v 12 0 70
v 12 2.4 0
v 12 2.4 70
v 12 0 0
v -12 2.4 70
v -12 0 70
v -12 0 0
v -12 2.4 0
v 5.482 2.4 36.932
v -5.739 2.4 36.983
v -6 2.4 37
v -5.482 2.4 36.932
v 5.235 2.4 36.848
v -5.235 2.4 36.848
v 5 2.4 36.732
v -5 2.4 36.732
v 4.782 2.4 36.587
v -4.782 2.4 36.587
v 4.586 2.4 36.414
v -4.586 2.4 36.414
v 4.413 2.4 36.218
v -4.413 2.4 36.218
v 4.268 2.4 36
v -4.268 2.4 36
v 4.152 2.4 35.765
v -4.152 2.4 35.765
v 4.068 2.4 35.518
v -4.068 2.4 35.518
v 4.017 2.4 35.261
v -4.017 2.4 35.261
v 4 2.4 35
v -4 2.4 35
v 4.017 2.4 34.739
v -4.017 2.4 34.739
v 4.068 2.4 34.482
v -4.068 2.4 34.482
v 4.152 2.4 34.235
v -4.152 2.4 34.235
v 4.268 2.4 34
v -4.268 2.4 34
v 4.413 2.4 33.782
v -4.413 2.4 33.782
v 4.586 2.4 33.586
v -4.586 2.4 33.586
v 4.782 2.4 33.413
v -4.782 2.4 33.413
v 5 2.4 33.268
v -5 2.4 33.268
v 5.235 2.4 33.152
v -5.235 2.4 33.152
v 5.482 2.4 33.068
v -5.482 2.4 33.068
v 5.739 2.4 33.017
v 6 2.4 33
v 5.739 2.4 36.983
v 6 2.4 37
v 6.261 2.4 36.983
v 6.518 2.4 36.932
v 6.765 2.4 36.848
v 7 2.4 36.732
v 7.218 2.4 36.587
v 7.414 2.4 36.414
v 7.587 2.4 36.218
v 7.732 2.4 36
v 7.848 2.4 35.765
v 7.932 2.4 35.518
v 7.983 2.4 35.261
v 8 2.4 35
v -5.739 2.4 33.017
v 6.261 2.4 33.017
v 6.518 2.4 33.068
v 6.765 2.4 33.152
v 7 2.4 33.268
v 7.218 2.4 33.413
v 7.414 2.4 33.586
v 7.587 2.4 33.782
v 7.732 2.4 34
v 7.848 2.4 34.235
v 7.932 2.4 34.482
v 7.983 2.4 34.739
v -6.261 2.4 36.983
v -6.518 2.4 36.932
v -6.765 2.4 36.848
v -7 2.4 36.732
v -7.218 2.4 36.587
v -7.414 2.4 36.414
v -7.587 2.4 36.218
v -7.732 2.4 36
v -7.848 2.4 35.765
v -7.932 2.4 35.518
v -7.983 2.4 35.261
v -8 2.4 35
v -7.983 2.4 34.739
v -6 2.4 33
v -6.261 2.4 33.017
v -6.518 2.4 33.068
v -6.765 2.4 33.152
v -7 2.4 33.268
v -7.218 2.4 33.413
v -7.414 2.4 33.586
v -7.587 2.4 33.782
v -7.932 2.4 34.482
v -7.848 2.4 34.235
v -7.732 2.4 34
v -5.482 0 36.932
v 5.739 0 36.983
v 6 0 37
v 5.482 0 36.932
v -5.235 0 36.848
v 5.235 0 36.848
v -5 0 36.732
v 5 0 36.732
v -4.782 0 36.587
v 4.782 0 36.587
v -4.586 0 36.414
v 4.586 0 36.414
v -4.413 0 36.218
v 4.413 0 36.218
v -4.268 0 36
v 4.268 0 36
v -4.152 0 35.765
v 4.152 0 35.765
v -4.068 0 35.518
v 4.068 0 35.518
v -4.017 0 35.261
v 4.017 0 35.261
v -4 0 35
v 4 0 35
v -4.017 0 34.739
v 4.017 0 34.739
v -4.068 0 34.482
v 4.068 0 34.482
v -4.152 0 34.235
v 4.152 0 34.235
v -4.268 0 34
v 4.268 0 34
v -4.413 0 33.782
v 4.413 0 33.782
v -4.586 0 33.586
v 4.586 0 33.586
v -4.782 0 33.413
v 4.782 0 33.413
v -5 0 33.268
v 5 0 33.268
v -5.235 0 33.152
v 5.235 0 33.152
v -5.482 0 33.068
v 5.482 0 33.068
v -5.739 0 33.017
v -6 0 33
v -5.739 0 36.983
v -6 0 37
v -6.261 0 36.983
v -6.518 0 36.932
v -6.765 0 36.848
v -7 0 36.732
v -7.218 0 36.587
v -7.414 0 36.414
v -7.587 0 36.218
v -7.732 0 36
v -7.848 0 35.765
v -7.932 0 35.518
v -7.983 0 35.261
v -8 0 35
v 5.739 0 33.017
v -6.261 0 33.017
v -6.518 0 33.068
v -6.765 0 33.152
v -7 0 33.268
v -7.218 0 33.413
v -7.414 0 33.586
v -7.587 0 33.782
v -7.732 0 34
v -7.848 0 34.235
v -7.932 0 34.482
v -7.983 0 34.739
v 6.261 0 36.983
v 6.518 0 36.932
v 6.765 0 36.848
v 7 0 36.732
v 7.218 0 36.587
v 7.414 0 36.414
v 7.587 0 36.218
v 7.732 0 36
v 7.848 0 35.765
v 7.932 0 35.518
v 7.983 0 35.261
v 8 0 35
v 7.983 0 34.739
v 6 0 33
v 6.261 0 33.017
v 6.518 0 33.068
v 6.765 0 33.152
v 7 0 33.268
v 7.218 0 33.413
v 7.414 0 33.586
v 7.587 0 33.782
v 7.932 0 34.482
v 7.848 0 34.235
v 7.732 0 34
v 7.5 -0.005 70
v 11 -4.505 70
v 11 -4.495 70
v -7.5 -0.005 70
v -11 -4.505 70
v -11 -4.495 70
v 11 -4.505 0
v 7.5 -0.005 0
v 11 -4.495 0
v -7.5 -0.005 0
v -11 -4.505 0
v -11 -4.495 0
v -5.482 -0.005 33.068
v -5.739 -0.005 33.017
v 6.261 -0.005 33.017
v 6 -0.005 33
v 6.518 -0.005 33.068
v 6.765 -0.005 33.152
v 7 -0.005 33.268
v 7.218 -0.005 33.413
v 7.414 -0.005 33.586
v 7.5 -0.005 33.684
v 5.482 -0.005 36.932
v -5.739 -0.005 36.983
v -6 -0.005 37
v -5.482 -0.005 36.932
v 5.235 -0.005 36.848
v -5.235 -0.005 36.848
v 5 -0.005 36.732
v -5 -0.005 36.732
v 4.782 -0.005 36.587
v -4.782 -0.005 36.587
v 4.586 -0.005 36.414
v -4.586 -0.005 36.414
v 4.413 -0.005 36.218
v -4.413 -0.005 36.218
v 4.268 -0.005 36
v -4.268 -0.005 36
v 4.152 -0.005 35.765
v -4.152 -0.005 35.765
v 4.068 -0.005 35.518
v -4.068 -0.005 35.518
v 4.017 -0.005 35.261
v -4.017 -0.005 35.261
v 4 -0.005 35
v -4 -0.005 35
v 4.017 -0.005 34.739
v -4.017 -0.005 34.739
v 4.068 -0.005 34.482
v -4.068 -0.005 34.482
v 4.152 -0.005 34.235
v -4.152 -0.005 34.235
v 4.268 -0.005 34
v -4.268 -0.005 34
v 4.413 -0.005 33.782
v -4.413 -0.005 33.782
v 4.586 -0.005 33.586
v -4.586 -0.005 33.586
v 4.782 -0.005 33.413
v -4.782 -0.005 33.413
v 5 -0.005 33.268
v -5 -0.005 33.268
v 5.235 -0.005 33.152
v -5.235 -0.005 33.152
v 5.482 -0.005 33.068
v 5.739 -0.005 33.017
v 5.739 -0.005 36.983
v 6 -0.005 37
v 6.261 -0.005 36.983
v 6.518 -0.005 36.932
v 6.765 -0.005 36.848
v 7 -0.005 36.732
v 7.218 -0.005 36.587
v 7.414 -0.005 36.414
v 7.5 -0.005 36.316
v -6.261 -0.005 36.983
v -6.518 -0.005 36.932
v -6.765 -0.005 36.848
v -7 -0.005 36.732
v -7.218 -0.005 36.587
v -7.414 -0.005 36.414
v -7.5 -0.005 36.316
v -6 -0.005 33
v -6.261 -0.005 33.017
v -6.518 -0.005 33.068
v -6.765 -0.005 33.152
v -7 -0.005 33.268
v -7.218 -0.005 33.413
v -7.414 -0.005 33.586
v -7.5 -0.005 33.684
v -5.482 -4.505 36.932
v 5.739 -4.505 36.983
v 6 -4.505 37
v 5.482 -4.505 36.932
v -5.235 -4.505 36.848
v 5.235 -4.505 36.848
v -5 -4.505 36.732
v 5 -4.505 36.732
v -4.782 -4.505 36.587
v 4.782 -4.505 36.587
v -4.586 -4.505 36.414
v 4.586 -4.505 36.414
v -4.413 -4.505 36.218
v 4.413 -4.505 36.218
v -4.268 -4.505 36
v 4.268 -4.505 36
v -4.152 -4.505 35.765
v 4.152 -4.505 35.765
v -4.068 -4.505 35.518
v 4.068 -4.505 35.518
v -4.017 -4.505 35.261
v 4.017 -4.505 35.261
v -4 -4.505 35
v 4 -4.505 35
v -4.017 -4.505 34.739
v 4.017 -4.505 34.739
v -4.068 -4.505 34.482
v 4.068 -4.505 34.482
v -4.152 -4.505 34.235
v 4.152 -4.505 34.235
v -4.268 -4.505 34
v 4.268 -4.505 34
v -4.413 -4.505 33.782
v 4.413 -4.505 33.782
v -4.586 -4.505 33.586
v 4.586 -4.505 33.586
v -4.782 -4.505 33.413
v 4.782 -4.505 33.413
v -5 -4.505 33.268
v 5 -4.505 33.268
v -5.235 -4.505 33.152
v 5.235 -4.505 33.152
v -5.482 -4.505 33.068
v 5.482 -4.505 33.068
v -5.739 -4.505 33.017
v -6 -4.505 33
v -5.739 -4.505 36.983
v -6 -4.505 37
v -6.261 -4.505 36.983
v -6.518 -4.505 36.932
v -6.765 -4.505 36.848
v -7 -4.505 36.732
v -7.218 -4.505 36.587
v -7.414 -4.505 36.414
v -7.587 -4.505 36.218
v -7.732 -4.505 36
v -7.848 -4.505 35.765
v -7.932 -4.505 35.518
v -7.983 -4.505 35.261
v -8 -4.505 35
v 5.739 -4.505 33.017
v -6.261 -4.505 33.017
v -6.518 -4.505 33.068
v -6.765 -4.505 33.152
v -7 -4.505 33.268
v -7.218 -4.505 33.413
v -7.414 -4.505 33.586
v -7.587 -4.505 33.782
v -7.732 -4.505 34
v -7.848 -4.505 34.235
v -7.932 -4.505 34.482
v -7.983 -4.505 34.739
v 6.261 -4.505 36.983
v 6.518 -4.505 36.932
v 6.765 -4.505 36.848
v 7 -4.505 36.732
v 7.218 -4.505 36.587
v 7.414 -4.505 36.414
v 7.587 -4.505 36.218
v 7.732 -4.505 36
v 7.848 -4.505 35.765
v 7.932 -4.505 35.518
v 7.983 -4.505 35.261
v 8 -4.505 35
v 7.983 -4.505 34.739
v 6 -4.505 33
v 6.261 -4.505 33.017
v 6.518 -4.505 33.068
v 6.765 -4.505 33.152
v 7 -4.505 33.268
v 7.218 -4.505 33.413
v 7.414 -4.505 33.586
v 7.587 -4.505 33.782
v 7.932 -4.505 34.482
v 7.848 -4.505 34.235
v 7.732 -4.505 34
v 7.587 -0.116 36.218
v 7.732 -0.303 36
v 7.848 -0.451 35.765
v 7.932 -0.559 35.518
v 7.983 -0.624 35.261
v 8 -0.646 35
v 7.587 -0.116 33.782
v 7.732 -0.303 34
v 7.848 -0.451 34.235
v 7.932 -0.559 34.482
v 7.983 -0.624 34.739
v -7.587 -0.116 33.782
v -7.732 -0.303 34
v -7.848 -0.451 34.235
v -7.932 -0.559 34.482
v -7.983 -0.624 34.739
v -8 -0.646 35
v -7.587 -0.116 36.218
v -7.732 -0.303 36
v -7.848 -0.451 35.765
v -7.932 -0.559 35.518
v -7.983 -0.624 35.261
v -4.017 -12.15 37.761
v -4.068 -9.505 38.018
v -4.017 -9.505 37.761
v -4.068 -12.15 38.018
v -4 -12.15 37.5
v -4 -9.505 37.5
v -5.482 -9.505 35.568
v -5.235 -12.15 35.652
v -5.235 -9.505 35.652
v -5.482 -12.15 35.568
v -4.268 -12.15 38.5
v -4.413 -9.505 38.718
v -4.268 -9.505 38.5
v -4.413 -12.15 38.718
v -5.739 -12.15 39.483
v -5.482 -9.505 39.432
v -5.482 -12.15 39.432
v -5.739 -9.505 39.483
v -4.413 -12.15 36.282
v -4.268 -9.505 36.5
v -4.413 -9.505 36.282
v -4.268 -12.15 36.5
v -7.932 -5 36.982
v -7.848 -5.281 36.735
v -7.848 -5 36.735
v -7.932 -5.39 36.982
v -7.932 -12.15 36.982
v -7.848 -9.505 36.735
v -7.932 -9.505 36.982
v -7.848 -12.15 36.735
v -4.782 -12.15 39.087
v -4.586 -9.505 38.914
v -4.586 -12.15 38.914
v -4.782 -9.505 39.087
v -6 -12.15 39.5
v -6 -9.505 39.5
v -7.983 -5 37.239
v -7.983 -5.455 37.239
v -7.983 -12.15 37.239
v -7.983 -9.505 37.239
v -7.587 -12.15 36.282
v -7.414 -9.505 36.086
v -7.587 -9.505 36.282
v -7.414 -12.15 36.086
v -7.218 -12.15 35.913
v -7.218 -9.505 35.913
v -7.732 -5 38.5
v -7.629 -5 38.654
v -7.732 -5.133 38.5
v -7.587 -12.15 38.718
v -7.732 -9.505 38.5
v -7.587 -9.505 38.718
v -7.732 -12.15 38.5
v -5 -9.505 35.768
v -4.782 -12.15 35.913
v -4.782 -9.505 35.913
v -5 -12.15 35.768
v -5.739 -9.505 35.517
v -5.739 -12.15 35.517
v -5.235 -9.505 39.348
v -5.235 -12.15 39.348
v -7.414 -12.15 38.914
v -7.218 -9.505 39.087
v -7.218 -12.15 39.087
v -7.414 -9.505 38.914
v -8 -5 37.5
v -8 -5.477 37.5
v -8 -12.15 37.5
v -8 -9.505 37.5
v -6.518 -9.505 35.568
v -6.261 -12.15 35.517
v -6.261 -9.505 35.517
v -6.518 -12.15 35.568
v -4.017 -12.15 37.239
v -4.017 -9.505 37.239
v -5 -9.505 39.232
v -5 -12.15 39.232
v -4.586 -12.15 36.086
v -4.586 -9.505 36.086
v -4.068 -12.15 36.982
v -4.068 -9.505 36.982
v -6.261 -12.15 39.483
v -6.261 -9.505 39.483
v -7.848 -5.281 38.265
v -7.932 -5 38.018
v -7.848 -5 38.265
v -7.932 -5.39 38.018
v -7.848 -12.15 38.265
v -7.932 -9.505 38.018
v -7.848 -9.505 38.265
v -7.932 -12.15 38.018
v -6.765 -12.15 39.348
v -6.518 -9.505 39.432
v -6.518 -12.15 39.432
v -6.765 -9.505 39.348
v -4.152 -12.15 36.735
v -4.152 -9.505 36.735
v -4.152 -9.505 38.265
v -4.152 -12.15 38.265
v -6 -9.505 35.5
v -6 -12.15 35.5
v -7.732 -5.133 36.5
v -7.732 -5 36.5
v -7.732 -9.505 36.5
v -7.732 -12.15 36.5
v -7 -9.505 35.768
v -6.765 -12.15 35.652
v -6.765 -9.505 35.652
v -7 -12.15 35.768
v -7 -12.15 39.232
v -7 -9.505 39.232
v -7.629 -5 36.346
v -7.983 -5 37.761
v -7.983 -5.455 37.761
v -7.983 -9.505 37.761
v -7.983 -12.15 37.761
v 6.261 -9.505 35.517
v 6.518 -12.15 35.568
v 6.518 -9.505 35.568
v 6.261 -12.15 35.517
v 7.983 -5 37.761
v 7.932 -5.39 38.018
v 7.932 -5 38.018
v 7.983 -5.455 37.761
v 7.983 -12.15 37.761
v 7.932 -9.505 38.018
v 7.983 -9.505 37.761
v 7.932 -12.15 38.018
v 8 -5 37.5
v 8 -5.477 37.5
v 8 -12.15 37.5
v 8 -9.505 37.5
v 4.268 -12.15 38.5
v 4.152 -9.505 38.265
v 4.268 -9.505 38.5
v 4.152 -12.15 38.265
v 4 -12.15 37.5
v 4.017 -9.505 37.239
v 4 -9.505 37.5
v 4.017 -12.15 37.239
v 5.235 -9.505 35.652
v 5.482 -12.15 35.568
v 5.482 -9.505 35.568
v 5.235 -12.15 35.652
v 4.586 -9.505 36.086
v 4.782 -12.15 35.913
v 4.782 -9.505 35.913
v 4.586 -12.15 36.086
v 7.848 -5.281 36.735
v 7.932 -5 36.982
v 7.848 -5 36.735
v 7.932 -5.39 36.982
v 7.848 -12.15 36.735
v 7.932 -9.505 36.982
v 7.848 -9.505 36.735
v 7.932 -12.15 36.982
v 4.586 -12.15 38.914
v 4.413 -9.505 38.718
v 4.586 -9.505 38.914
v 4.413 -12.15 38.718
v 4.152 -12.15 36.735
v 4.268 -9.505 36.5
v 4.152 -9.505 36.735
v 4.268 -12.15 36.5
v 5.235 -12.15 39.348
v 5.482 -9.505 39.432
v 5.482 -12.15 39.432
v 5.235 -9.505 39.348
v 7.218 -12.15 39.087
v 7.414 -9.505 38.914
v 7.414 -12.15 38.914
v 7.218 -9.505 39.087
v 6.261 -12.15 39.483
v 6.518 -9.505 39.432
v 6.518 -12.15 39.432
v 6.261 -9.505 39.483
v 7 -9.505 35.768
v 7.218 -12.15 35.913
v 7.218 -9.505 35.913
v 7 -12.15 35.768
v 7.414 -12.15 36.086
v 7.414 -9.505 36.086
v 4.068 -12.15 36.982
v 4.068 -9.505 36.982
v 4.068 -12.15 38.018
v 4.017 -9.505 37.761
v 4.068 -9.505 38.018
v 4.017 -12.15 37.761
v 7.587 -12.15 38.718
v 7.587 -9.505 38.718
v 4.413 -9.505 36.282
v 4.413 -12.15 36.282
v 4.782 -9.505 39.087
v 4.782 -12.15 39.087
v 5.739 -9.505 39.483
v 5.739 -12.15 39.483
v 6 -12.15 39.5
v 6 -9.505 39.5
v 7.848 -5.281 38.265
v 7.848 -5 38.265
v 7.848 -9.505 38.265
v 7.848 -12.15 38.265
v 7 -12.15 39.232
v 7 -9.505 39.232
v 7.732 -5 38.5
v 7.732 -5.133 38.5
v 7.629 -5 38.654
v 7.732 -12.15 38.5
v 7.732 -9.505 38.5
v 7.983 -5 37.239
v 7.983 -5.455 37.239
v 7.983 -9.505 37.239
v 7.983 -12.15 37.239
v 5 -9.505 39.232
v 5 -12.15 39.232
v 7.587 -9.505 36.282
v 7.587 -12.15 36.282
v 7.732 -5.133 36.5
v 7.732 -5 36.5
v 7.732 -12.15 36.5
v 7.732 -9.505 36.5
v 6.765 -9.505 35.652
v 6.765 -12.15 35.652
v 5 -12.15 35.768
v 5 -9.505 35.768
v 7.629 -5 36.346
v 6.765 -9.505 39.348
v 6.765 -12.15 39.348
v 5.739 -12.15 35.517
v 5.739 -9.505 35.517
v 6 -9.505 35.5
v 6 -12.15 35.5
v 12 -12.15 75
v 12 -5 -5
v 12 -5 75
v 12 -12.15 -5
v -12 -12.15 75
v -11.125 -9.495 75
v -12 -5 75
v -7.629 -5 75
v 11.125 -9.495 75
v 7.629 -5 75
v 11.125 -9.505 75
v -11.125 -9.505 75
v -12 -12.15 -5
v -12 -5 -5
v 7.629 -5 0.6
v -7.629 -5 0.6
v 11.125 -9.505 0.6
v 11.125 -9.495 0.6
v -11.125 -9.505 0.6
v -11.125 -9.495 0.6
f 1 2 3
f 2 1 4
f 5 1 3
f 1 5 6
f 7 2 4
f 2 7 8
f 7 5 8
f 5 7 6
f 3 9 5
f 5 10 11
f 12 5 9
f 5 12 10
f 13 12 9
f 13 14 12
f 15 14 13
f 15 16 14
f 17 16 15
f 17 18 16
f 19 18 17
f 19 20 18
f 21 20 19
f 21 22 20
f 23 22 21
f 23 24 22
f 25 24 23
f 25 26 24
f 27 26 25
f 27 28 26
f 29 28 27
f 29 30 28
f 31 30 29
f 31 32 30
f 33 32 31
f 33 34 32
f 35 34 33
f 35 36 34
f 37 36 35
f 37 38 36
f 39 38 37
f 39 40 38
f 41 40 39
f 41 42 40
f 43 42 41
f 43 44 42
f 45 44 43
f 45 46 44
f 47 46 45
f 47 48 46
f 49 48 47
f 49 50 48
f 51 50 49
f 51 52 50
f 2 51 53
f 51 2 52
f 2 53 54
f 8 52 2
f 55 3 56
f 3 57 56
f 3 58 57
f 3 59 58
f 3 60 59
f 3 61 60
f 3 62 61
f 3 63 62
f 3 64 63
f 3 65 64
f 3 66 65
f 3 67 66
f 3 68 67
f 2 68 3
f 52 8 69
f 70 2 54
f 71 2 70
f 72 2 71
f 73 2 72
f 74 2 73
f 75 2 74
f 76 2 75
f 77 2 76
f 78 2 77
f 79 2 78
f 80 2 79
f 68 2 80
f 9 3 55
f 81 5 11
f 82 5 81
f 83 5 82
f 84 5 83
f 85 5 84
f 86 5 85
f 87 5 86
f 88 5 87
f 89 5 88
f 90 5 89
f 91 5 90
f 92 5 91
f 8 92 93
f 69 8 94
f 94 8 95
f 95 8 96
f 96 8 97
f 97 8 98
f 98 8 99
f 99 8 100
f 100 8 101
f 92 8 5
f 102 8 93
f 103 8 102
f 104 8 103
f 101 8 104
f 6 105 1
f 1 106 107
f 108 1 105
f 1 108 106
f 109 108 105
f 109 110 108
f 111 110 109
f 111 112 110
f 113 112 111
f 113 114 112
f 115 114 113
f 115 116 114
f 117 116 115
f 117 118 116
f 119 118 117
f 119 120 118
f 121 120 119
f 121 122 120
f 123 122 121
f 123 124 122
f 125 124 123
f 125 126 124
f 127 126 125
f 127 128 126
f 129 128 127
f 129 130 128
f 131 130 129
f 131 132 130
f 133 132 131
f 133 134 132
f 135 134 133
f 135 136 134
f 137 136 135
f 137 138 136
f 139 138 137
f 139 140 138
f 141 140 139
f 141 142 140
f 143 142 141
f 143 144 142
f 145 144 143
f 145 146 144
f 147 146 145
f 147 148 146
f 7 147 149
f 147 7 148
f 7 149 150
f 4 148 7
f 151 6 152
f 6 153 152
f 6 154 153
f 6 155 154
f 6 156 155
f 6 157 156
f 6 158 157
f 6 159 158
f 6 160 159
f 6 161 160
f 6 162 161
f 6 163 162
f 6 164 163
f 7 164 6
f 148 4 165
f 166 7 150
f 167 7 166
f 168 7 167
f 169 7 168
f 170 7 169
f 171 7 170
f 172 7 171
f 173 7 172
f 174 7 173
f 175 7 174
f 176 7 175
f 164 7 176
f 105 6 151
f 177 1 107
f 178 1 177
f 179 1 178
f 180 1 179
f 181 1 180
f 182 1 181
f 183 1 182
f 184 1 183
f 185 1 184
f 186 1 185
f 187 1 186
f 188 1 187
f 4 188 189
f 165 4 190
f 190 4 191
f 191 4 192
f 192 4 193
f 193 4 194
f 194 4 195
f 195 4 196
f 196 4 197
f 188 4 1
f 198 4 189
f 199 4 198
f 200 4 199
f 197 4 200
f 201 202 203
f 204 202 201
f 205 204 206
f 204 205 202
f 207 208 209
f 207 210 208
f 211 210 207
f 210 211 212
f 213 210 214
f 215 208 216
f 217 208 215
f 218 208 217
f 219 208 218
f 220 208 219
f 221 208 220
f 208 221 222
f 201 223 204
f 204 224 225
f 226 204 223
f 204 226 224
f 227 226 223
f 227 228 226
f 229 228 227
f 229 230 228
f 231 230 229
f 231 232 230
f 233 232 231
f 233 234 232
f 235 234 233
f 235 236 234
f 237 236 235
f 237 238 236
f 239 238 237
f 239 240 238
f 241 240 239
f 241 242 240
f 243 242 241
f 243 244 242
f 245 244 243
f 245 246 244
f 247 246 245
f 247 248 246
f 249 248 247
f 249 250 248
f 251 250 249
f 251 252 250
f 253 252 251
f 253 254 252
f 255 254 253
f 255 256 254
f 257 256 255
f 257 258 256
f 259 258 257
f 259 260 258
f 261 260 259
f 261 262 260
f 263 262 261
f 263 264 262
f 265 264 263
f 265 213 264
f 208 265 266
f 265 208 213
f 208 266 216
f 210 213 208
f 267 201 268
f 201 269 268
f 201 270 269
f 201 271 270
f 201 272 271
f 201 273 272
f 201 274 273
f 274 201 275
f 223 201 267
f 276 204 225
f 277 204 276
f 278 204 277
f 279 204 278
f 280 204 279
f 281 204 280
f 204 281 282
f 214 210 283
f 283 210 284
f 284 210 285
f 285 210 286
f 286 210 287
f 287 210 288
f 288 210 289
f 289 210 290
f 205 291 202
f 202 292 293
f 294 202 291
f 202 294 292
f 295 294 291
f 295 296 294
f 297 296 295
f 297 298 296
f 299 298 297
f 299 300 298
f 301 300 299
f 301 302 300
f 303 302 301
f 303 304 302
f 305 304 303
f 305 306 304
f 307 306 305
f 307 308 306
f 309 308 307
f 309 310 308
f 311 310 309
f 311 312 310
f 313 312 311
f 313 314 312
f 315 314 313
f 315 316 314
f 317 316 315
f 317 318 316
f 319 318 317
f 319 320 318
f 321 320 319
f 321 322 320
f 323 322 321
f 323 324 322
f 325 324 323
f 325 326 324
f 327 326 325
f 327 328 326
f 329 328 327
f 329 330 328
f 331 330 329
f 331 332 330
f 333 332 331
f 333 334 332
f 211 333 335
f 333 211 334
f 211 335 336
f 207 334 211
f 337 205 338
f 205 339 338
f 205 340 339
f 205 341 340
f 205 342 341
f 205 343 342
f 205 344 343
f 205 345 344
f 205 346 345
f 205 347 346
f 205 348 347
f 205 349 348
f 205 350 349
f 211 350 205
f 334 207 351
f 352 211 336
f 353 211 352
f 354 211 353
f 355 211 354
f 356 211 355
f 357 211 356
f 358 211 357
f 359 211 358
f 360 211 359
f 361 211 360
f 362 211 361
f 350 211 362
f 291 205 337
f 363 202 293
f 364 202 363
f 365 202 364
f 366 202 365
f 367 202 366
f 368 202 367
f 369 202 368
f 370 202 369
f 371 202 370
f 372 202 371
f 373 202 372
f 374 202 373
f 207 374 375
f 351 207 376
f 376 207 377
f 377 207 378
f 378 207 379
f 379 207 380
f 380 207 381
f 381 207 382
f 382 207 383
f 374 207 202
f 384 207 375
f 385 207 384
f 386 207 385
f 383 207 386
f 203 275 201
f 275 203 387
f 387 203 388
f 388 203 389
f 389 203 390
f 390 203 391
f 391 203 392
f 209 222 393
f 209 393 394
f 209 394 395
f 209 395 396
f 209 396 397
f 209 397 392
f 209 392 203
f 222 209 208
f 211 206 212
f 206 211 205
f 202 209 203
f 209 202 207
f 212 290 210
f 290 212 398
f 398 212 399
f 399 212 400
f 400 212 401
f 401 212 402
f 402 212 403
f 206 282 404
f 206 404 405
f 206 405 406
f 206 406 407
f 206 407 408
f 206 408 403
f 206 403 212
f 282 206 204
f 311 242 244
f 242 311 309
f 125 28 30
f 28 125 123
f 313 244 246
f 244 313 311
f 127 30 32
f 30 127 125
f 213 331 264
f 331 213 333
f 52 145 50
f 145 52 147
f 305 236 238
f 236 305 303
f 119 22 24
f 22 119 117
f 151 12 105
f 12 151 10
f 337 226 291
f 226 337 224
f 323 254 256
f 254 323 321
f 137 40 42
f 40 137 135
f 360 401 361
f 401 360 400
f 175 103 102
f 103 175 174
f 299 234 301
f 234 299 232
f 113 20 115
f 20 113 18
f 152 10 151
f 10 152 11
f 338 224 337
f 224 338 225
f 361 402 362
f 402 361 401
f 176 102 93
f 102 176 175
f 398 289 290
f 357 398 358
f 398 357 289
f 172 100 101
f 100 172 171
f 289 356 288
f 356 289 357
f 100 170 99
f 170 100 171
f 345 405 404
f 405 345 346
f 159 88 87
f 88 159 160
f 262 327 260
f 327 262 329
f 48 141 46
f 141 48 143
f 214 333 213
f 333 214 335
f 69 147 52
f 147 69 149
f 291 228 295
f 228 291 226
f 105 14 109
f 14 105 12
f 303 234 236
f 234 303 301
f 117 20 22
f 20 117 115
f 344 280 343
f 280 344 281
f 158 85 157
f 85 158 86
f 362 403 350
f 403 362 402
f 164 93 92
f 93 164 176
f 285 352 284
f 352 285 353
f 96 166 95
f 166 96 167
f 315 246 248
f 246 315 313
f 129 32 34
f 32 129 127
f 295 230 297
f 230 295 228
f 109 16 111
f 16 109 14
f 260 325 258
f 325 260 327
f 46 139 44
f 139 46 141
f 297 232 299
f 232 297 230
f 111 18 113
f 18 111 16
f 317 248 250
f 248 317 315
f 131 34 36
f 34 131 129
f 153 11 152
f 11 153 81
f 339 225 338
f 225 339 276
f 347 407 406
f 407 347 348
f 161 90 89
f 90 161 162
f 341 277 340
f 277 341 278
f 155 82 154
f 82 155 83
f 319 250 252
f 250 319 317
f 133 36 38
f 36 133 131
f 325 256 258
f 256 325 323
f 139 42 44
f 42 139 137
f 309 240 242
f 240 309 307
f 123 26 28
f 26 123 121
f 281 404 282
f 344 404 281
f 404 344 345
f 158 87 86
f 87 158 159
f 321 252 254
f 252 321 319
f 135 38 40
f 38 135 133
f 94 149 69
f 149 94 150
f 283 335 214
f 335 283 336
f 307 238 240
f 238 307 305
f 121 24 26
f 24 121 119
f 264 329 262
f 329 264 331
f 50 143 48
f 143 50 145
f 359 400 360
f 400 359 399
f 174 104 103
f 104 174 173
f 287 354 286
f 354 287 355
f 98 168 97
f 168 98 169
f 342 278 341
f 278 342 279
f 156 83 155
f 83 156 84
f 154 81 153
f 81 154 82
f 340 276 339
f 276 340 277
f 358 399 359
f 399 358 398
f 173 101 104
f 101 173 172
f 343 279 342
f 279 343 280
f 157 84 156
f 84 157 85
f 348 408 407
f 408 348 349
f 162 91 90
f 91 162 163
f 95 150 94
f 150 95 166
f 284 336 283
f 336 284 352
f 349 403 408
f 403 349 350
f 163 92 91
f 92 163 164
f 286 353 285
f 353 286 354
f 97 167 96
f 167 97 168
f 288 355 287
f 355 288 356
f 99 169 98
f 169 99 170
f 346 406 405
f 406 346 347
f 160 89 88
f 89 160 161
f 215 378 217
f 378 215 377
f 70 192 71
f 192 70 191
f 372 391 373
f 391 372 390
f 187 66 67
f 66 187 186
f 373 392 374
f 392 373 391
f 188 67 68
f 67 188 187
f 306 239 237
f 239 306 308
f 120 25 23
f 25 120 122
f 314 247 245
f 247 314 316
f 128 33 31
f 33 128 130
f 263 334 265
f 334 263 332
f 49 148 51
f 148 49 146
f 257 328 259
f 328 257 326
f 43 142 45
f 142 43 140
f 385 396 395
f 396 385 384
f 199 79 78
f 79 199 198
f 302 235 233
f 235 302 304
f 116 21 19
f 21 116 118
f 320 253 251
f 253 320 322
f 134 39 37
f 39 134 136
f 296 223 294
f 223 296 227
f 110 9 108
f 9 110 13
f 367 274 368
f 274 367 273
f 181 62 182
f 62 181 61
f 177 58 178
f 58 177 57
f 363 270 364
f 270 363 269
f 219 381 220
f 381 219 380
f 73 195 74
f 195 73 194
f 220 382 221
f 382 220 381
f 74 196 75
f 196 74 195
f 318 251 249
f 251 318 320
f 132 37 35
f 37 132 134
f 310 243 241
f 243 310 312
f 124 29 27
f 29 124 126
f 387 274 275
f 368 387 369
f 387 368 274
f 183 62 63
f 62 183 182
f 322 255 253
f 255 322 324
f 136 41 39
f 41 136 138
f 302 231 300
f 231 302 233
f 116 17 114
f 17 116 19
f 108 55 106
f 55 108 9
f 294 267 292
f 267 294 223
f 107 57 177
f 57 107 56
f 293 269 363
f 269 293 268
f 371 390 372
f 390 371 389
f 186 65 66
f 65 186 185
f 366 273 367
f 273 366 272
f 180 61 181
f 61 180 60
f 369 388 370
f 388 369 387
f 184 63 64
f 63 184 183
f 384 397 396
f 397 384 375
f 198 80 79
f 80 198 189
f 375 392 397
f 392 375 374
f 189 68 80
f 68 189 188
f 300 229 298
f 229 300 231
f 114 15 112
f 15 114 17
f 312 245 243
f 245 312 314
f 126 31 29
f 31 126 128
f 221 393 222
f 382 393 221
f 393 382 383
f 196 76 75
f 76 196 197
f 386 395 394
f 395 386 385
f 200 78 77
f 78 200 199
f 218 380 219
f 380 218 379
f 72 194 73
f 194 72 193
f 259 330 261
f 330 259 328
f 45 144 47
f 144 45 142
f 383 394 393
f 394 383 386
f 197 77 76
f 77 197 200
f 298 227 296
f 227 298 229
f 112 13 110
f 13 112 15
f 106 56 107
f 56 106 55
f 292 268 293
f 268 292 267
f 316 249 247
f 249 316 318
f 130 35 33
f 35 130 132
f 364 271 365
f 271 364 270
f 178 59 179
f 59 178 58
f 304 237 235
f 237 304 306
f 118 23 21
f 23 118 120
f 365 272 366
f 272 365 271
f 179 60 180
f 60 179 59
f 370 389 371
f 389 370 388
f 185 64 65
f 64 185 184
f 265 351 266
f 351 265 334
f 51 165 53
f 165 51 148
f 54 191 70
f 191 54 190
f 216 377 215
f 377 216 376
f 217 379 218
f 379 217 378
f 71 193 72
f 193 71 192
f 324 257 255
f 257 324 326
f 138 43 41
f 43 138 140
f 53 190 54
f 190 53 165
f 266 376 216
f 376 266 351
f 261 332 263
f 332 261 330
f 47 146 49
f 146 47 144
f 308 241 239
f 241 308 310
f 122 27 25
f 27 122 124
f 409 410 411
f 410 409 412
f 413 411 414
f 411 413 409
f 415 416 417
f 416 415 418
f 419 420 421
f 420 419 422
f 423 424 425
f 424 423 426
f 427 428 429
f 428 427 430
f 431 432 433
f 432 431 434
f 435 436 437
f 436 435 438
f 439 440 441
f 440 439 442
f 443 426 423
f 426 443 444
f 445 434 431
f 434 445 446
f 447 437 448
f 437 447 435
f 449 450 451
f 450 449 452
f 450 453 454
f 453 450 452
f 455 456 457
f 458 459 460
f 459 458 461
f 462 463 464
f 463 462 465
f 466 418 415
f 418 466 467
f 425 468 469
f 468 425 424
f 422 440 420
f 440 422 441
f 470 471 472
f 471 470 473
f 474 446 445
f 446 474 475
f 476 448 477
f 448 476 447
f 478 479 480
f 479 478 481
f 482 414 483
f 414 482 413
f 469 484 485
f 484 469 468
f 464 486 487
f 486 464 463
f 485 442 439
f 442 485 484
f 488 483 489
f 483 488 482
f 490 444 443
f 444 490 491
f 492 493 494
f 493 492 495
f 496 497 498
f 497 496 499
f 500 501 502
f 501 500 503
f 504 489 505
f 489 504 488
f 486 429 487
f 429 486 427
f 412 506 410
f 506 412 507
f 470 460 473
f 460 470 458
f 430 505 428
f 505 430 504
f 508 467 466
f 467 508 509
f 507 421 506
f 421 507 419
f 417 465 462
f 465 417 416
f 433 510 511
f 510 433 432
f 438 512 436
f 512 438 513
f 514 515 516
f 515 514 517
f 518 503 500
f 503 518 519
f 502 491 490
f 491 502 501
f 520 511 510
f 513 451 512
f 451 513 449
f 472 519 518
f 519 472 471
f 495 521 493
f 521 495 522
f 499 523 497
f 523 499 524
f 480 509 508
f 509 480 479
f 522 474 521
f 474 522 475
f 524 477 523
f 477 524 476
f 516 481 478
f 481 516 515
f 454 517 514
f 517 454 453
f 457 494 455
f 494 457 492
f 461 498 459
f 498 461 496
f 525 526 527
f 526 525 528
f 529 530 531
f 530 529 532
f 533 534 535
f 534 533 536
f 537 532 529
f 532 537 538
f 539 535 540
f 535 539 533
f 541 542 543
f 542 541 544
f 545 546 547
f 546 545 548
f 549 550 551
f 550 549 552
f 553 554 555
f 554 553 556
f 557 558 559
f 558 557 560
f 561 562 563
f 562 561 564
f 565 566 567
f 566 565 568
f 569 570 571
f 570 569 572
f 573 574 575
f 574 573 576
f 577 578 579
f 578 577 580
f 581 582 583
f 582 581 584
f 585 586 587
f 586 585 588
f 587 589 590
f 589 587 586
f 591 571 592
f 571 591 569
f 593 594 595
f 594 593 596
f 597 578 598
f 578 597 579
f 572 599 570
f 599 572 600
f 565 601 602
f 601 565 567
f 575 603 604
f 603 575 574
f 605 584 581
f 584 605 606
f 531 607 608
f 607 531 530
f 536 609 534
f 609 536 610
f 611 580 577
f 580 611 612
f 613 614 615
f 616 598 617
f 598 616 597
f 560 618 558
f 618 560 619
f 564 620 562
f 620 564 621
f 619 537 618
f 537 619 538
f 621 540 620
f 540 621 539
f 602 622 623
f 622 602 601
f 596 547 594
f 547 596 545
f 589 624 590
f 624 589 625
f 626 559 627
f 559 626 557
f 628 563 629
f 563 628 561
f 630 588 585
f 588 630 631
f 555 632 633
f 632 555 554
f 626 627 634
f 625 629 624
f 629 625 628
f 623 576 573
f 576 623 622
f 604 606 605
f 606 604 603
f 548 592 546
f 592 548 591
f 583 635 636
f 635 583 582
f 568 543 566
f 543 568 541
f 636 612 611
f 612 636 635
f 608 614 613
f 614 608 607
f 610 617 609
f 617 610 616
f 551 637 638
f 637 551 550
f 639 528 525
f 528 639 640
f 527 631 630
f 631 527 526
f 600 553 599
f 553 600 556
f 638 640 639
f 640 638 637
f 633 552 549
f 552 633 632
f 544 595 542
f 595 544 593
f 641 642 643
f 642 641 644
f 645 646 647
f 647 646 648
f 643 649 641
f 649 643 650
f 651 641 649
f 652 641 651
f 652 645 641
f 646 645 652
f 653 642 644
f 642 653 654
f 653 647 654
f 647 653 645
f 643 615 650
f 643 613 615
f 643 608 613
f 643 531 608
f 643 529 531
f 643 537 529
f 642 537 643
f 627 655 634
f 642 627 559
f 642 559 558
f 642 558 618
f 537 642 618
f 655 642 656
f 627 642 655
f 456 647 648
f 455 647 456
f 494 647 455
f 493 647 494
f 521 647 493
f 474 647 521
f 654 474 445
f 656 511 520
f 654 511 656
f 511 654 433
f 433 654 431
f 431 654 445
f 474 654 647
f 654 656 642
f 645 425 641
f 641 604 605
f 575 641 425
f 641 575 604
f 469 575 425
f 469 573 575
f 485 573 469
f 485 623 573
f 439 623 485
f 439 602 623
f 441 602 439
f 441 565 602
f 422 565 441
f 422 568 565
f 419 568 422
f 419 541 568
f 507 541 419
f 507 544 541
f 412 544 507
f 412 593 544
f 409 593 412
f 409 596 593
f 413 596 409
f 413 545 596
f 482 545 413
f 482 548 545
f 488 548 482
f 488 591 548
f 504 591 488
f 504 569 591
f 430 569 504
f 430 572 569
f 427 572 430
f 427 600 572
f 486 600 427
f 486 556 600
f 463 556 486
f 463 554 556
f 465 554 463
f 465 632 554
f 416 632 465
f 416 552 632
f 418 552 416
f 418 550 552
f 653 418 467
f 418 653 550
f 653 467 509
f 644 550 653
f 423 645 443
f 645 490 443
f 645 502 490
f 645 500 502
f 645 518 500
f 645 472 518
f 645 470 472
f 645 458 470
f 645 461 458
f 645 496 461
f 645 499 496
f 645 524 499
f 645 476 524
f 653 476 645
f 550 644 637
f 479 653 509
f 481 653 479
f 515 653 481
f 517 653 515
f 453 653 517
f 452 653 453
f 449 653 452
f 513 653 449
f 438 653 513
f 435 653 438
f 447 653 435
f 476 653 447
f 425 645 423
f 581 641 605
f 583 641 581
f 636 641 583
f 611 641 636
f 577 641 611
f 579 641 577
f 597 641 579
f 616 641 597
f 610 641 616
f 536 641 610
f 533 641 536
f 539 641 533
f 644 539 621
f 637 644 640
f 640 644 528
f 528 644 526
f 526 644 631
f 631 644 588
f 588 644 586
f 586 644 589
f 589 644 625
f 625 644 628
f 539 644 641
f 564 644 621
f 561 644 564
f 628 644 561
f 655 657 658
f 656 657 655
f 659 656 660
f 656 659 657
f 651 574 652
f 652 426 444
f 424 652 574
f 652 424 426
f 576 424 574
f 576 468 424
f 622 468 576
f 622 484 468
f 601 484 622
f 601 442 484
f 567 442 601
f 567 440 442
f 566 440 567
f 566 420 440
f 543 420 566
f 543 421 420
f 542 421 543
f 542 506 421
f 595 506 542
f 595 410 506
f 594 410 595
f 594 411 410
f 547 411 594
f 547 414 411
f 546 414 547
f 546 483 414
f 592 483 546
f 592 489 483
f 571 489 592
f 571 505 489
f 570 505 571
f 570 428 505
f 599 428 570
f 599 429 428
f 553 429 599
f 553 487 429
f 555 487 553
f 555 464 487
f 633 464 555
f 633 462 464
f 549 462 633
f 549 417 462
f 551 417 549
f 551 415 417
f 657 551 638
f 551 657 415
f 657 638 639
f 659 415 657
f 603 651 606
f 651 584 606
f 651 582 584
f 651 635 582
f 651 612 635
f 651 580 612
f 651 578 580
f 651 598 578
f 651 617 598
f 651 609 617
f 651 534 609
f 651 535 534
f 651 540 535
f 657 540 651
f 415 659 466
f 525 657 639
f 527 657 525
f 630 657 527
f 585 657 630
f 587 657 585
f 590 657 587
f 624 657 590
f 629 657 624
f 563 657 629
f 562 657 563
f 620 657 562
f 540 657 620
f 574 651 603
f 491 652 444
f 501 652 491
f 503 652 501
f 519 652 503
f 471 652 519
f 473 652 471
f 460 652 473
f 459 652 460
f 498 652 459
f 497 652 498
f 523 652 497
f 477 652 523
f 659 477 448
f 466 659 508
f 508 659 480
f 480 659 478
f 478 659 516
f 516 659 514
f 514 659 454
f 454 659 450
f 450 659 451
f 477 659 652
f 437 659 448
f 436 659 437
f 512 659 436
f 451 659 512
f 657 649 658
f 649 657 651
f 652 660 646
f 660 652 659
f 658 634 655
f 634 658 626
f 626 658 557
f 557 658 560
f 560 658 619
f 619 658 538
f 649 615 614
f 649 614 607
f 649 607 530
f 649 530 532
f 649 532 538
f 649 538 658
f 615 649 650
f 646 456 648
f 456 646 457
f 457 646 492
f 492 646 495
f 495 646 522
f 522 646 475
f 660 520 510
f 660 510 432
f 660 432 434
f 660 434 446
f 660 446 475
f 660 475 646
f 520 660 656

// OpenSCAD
/* ========================================================================== */ // Starts the file header.
/* Dovetail from the box/bin model, extracted and parameterized. */ // Describes the model origin.
/* The dovetail can be screwed or glued to the back of what is mounted. */ // Describes the intended use.
/* Designed by Notydesign. */ // Credits the original designer.
/* Comments and documentation added for easier maintenance. */ // States why the file is heavily commented.
/* ========================================================================== */ // Ends the file header.
// All dimensions in this file are millimeters. // Defines the unit used by every numeric dimension.
// X is width, Y is depth/thickness, and Z is height. // Defines the coordinate convention.
// OpenSCAD Customizer reads section titles written inside square brackets. // Explains the bracketed headings below.

/* [Display options] */ // Groups settings that control preview visibility.
show_dovetail = true; // Shows the male dovetail part.
show_bracket = true; // Shows the female bracket part.
mirror_backstop = false; // Rotates the preview 180 degrees around the Y axis so the stop is mirrored.
color = "#4682B4"; // Sets the preview color for both generated parts.

/* [Dovetail male parameters] */ // Groups the main dimensions for the male dovetail.
dovetail_width_wide = 22; // Sets the widest width of the dovetail profile at the outer face.
dovetail_width_narrow = 15; // Sets the narrowest width of the dovetail profile near the plate.
dovetail_depth = 4.5; // Sets how far the dovetail profile projects in the Y direction.
dovetail_tolerance = 0.25; // Sets clearance between the male and female parts for 3D printing fit.
dovetail_plate_width = 24; // Sets the width of the male mounting plate.
dovetail_plate_thickness = 2.4; // Sets the thickness of the male mounting plate.
dovetail_plate_height = 70; // Sets the total height of the male dovetail part.

/* [Dovetail male screw hole parameters] */ // Groups screw-hole settings for the male part.
show_dovetail_screw_holes = true; // Enables through screw holes in the male part.
dovetail_screw_count = 2; // Sets the number of screw holes per row in the X direction.
dovetail_screw_row_count = 1; // Sets the number of screw rows in the Z direction.
dovetail_screw_row_spacing = 20; // Sets the center-to-center spacing between screw rows.
dovetail_screw_edge_margin = 6; // Sets the margin from each side edge to the outermost screw hole.
mount_screw_hole_diameter = 4; // Sets the diameter of the male screw holes.

/* [Dovetail male countersink parameters] */ // Groups countersink settings for the male screw holes.
male_screw_countersink_style = "none"; // Selects the countersink style: none, cone, or cylinder.
male_screw_countersink_side = "back"; // Selects the countersink side: front, back, or both.
male_screw_countersink_diameter = 8; // Sets the outer diameter of the male countersink.
male_screw_countersink_depth = 1.6; // Sets how deep the male countersink cuts into the part.

/* [Dovetail female parameters] */ // Groups the main dimensions for the female bracket.
dovetail_female_extra_height = 5; // Adds extra height above the nominal male-part height.
dovetail_female_extra_width = 0; // Adds extra side material to the female block.
dovetail_female_rail_rib_depth = 0; // Adds outside 45-degree strengthening ribs when greater than zero.
dovetail_female_backstop_bridge_height = 0.6; // Keeps a small solid bridge above the stop so the bracket remains one connected body.
female_backstop = 5.0; // Sets the stop height below the slot so the male part cannot slide through.

/* [Dovetail female screw hole parameters] */ // Groups screw-hole settings for the female part.
show_female_screw_holes = true; // Enables through screw holes in the female part.
dovetail_female_screw_count = 2; // Sets the number of female screw holes per row in the X direction.
dovetail_female_screw_row_count = 1; // Sets the number of female screw rows in the Z direction.
dovetail_female_screw_row_spacing = 20; // Sets the center-to-center spacing between female screw rows.
dovetail_female_screw_edge_margin = 6; // Sets the margin from each female side edge to the outermost screw hole.
dovetail_female_mount_screw_hole_diameter = 4; // Sets the diameter of the female screw holes.

/* [Dovetail female countersink parameters] */ // Groups countersink settings for the female screw holes.
female_screw_countersink_style = "none"; // Selects the countersink style: none, cone, or cylinder.
female_screw_countersink_side = "front"; // Selects the countersink side: front, back, or both.
female_screw_countersink_diameter = 8; // Sets the outer diameter of the female countersink.
female_screw_countersink_depth = 1.6; // Sets how deep the female countersink cuts into the part.

/* [Helper variables] */ // Groups internal helper values.
distance_between_brackets = -5.0; // Offsets the female bracket in Y so both parts are visible in preview.

/* Main preview */ // Starts the top-level rendering logic.
if (mirror_backstop) { // Uses a rotated render group when the mirrored view is enabled.
    translate([0, 0, dovetail_plate_height]) // Moves the model upward before rotation so it stays near the work plane.
    rotate([0, 180, 0]) { // Rotates the selected preview geometry 180 degrees around the Y axis.
        if (show_dovetail) { // Checks whether the male part should be displayed.
            dovetail_male(); // Renders the male dovetail part.
        } // Ends the mirrored male-part visibility check.
        if (show_bracket) { // Checks whether the female bracket should be displayed.
            dovetail_female(); // Renders the female bracket part.
        } // Ends the mirrored female-part visibility check.
    } // Ends the rotated preview group.
} else { // Uses the normal orientation when mirroring is disabled.
    if (show_dovetail) { // Checks whether the male part should be displayed.
        dovetail_male(); // Renders the male dovetail part.
    } // Ends the male-part visibility check.
    if (show_bracket) { // Checks whether the female bracket should be displayed.
        dovetail_female(); // Renders the female bracket part.
    } // Ends the female-part visibility check.
} // Ends the top-level rendering logic.

module dovetail_male() { // Defines the male part with plate, dovetail profile, and optional screw holes.
    color(color) // Applies the preview color to the male part.
    difference() { // Creates the final shape by subtracting holes from the solid geometry.
        union() { // Combines the mounting plate and dovetail profile into one body.
            translate([-dovetail_plate_width / 2, 0, 0]) // Centers the mounting plate in the X direction.
            cube([dovetail_plate_width, dovetail_plate_thickness, dovetail_plate_height]); // Creates the flat mounting plate.

            translate([0, 0, dovetail_plate_height / 2]) // Moves the profile so it is centered over the part height.
            hull() { // Builds a trapezoid-like dovetail profile between two thin rectangles.
                translate([0, -0.01, 0]) // Places the narrow profile line near the plate face.
                cube([dovetail_width_narrow, 0.01, dovetail_plate_height], center = true); // Creates the narrow side of the dovetail profile.

                translate([0, -dovetail_depth, 0]) // Places the wide profile line at the outer Y position.
                cube([dovetail_width_wide, 0.01, dovetail_plate_height], center = true); // Creates the wide side of the dovetail profile.
            } // Ends the hull used for the male profile.
        } // Ends the male solid geometry.

        if (show_dovetail_screw_holes) { // Cuts screw holes only when the setting is enabled.
            hole_positions = (dovetail_screw_count == 1) ? [0] // Uses the center position when only one screw hole is requested.
                : [for (i = [0 : dovetail_screw_count - 1]) // Calculates multiple screw holes evenly across the plate width.
                    -dovetail_plate_width / 2 + dovetail_screw_edge_margin + i * (dovetail_plate_width - 2 * dovetail_screw_edge_margin) / max(1, dovetail_screw_count - 1)]; // Returns X positions with edge margins.
            row_count = max(1, dovetail_screw_row_count); // Ensures at least one screw row is used.
            row_positions = (row_count == 1) ? [dovetail_plate_height / 2] // Centers a single row on the part height.
                : [for (r = [0 : row_count - 1]) // Calculates multiple rows in the Z direction.
                    dovetail_plate_height / 2 - ((row_count - 1) * dovetail_screw_row_spacing) / 2 + r * dovetail_screw_row_spacing]; // Returns Z positions centered around the part midpoint.
            for (x_pos = hole_positions) { // Iterates over every calculated X position.
                for (z_pos = row_positions) { // Iterates over every calculated Z position.
                    screw_hole_with_countersink( // Cuts one through hole and any requested countersink.
                        x_pos = x_pos, // Passes the screw-hole X position.
                        y_pos = dovetail_plate_thickness / 2, // Places the cutter through the plate in the Y direction.
                        z_pos = z_pos, // Passes the screw-hole Z position.
                        hole_length = dovetail_depth + dovetail_plate_thickness + 5, // Makes the cutter longer than the part so it fully clears the geometry.
                        hole_diameter = mount_screw_hole_diameter, // Passes the male screw-hole diameter.
                        countersink_style = male_screw_countersink_style, // Passes the selected countersink style.
                        countersink_side = male_screw_countersink_side, // Passes the selected countersink side.
                        countersink_diameter = male_screw_countersink_diameter, // Passes the countersink diameter.
                        countersink_depth = male_screw_countersink_depth, // Passes the countersink depth.
                        front_surface_y = -dovetail_depth, // Defines the front surface at the dovetail side.
                        back_surface_y = dovetail_plate_thickness // Defines the back surface at the plate side.
                    ); // Ends the hole-and-countersink cutter call.
                } // Ends the Z-position loop.
            } // Ends the X-position loop.
        } // Ends the male screw-hole condition.
    } // Ends the male difference operation.
} // Ends the male dovetail module.

module dovetail_female() { // Defines the female bracket with receiving slot, stop, ribs, and screw holes.
    dovetail_female_width = dovetail_plate_width + dovetail_female_extra_width; // Calculates the total female block width.
    dovetail_female_bridge_height = min(dovetail_female_backstop_bridge_height, max(0, dovetail_female_extra_height)); // Limits the bridge height to the available extra height.
    dovetail_female_slot_height = dovetail_plate_height + dovetail_female_extra_height - dovetail_female_bridge_height + 0.1; // Calculates the slot cutter height with a small overlap.

    color(color) // Applies the preview color to the female bracket.
    translate([0, distance_between_brackets, 0]) // Moves the female bracket in Y for a clearer preview.
    difference() { // Creates the female bracket by subtracting slot and holes from the block.
        union() { // Combines the solid block and optional ribs.
            translate([-dovetail_female_width / 2, -dovetail_depth - dovetail_plate_thickness - dovetail_tolerance, -female_backstop]) // Places the block with the stop below the zero plane.
            cube([dovetail_female_width, dovetail_depth + dovetail_plate_thickness + dovetail_tolerance, dovetail_plate_height + dovetail_female_extra_height + female_backstop]); // Creates the solid receiving block.

            if (dovetail_female_rail_rib_depth > 0) { // Adds ribs only when rib depth is enabled.
                female_rail_ribs(dovetail_female_width, dovetail_female_rail_rib_depth); // Creates strengthening ribs along the outside of the slot rails.
            } // Ends the rib condition.
        } // Ends the female solid geometry.

        translate([0, 0, dovetail_female_bridge_height + dovetail_female_slot_height / 2]) // Positions the slot cutter above the stop and bridge.
        hull() { // Builds a trapezoid-like negative volume matching the male profile.
            translate([0, 0, 0]) // Places the narrow negative profile line at the slot front.
            cube([dovetail_width_narrow + dovetail_tolerance, 0.01, dovetail_female_slot_height], center = true); // Cuts the narrow slot side with tolerance.

            translate([0, -dovetail_depth, 0]) // Places the wide negative profile line farther back in the slot.
            cube([dovetail_width_wide + dovetail_tolerance, 0.01, dovetail_female_slot_height], center = true); // Cuts the wide slot side with tolerance.
        } // Ends the hull used to cut the female slot.

        if (show_female_screw_holes) { // Cuts female screw holes only when the setting is enabled.
            female_front_screw_surface_y = -dovetail_depth; // Defines the slot-bottom/front surface Y position for countersinks.
            female_back_screw_surface_y = -dovetail_depth - dovetail_plate_thickness - dovetail_tolerance; // Defines the back surface Y position for countersinks.

            hole_positions = (dovetail_female_screw_count == 1) ? [0] // Uses the center position when only one female screw hole is requested.
                : [for (i = [0 : dovetail_female_screw_count - 1]) // Calculates multiple female screw holes evenly across the width.
                    -dovetail_female_width / 2 + dovetail_female_screw_edge_margin + i * (dovetail_female_width - 2 * dovetail_female_screw_edge_margin) / max(1, dovetail_female_screw_count - 1)]; // Returns X positions with female edge margins.

            row_count = max(1, dovetail_female_screw_row_count); // Ensures at least one female screw row is used.
            row_positions = (row_count == 1) ? [dovetail_plate_height / 2 + dovetail_female_extra_height / 2] // Centers a single row over the active female height.
                : [for (r = [0 : row_count - 1]) // Calculates multiple female rows in the Z direction.
                    dovetail_plate_height / 2 + dovetail_female_extra_height / 2 - ((row_count - 1) * dovetail_female_screw_row_spacing) / 2 + r * dovetail_female_screw_row_spacing]; // Returns Z positions centered around the female bracket.

            for (x_pos = hole_positions) { // Iterates over every calculated female X position.
                for (z_pos = row_positions) { // Iterates over every calculated female Z position.
                    screw_hole_with_countersink( // Cuts one female through hole and any requested countersink.
                        x_pos = x_pos, // Passes the screw-hole X position.
                        y_pos = -dovetail_plate_thickness / 2, // Places the cutter through the female block wall.
                        z_pos = z_pos, // Passes the screw-hole Z position.
                        hole_length = dovetail_depth + dovetail_plate_thickness + 6, // Makes the cutter long enough to fully clear the female wall.
                        hole_diameter = dovetail_female_mount_screw_hole_diameter, // Passes the female screw-hole diameter.
                        countersink_style = female_screw_countersink_style, // Passes the female countersink style.
                        countersink_side = female_screw_countersink_side, // Passes the female countersink side.
                        countersink_diameter = female_screw_countersink_diameter, // Passes the female countersink diameter.
                        countersink_depth = female_screw_countersink_depth, // Passes the female countersink depth.
                        front_surface_y = female_front_screw_surface_y, // Defines the female front surface for countersinking.
                        back_surface_y = female_back_screw_surface_y // Defines the female back surface for countersinking.
                    ); // Ends the female hole-and-countersink cutter call.
                } // Ends the female Z-position loop.
            } // Ends the female X-position loop.
        } // Ends the female screw-hole condition.
    } // Ends the female difference operation.
} // Ends the female bracket module.

module female_rail_ribs(female_width, rib_depth) { // Defines optional outside strengthening ribs for the female bracket.
    rib_height = dovetail_plate_height + dovetail_female_extra_height + female_backstop; // Calculates the full rib height including the stop.
    rib_y_back = -dovetail_depth - dovetail_plate_thickness - dovetail_tolerance; // Defines the back Y position of each rib.
    rib_y_front = -dovetail_depth; // Defines the front Y position of each rib near the slot.
    rib_width = min(rib_depth, max(0.01, dovetail_female_extra_width / 2 + (dovetail_plate_width - dovetail_width_wide - dovetail_tolerance) / 2)); // Limits rib width so it fits beside the slot.

    for (side = [-1, 1]) { // Creates one rib on the left side and one on the right side.
        hull() { // Builds a tapered rib between a wider rear edge and a narrow front edge.
            translate([side * (female_width / 2 - rib_width / 2), rib_y_back, rib_height / 2 - female_backstop]) // Places the wide rear edge of the rib.
            cube([rib_width, 0.01, rib_height], center = true); // Creates the wide rear rib face.

            translate([side * (female_width / 2 - rib_width / 2), rib_y_front, rib_height / 2 - female_backstop]) // Places the narrow front edge of the rib.
            cube([0.01, 0.01, rib_height], center = true); // Creates the rib tip near the slot.
        } // Ends the hull for one rib.
    } // Ends the side loop for the ribs.
} // Ends the rib module.

module screw_hole_with_countersink( // Defines a through hole with an optional countersink.
    x_pos, // Receives the hole X position.
    y_pos, // Receives the hole Y position.
    z_pos, // Receives the hole Z position.
    hole_length, // Receives the cutting length of the hole.
    hole_diameter, // Receives the hole diameter.
    countersink_style, // Receives the countersink style.
    countersink_side, // Receives which side should be countersunk.
    countersink_diameter, // Receives the countersink diameter.
    countersink_depth, // Receives the countersink depth.
    front_surface_y, // Receives the front surface Y position.
    back_surface_y // Receives the back surface Y position.
) { // Starts the hole module body.
    translate([x_pos, y_pos, z_pos]) // Places the cylinder where the hole should be cut.
    rotate([90, 0, 0]) // Rotates the cylinder so the hole runs along the Y axis.
    cylinder(h = hole_length, d = hole_diameter, center = true, $fn = 48); // Creates the negative cylinder for the through hole.

    if (countersink_style != "none" && countersink_depth > 0) { // Creates countersinks only when a style and positive depth are set.
        if (countersink_side == "front" || countersink_side == "both") { // Checks whether the front side should be countersunk.
            screw_countersink_at( // Cuts one countersink at the front surface.
                x_pos = x_pos, // Passes the hole X position.
                surface_y = front_surface_y, // Passes the front surface Y position.
                z_pos = z_pos, // Passes the hole Z position.
                hole_diameter = hole_diameter, // Passes the through-hole diameter.
                countersink_style = countersink_style, // Passes the countersink style.
                countersink_diameter = countersink_diameter, // Passes the countersink diameter.
                countersink_depth = countersink_depth, // Passes the countersink depth.
                inward_direction_y = (front_surface_y < back_surface_y) ? 1 : -1 // Calculates the inward cutting direction from the front surface.
            ); // Ends the front countersink call.
        } // Ends the front countersink condition.

        if (countersink_side == "back" || countersink_side == "both") { // Checks whether the back side should be countersunk.
            screw_countersink_at( // Cuts one countersink at the back surface.
                x_pos = x_pos, // Passes the hole X position.
                surface_y = back_surface_y, // Passes the back surface Y position.
                z_pos = z_pos, // Passes the hole Z position.
                hole_diameter = hole_diameter, // Passes the through-hole diameter.
                countersink_style = countersink_style, // Passes the countersink style.
                countersink_diameter = countersink_diameter, // Passes the countersink diameter.
                countersink_depth = countersink_depth, // Passes the countersink depth.
                inward_direction_y = (back_surface_y < front_surface_y) ? 1 : -1 // Calculates the inward cutting direction from the back surface.
            ); // Ends the back countersink call.
        } // Ends the back countersink condition.
    } // Ends the countersink logic.
} // Ends the hole-with-countersink module.

module screw_countersink_at( // Defines one countersink at a specified surface.
    x_pos, // Receives the countersink X position.
    surface_y, // Receives the Y position of the surface where the countersink starts.
    z_pos, // Receives the countersink Z position.
    hole_diameter, // Receives the base through-hole diameter.
    countersink_style, // Receives the countersink style.
    countersink_diameter, // Receives the requested countersink diameter.
    countersink_depth, // Receives the requested countersink depth.
    inward_direction_y // Receives the inward cutting direction along the Y axis.
) { // Starts the countersink module body.
    safe_countersink_diameter = max(countersink_diameter, hole_diameter); // Ensures the countersink is never smaller than the through hole.
    translate([x_pos, surface_y - inward_direction_y * 0.01, z_pos]) // Places the countersink with a tiny overlap against the surface.
    rotate([inward_direction_y > 0 ? -90 : 90, 0, 0]) { // Rotates the countersink so it cuts into the material.
        if (countersink_style == "cone") { // Selects a conical countersink.
            cylinder( // Creates the conical negative volume.
                h = countersink_depth + 0.02, // Adds a small extra depth for reliable boolean subtraction.
                d1 = safe_countersink_diameter, // Sets the outer diameter at the surface.
                d2 = hole_diameter, // Sets the inner diameter at the through hole.
                center = false, // Starts the cylinder at the surface instead of centering it.
                $fn = 64 // Uses more facets for a smoother countersink.
            ); // Ends the conical cylinder.
        } else if (countersink_style == "cylinder") { // Selects a cylindrical counterbore.
            cylinder( // Creates the cylindrical negative volume.
                h = countersink_depth + 0.02, // Adds a small extra depth for reliable boolean subtraction.
                d = safe_countersink_diameter, // Sets the counterbore diameter.
                center = false, // Starts the cylinder at the surface instead of centering it.
                $fn = 64 // Uses more facets for a smoother counterbore.
            ); // Ends the cylindrical counterbore.
        } // Ends the countersink-style selection.
    } // Ends the countersink rotation block.
} // Ends the single-countersink module.
